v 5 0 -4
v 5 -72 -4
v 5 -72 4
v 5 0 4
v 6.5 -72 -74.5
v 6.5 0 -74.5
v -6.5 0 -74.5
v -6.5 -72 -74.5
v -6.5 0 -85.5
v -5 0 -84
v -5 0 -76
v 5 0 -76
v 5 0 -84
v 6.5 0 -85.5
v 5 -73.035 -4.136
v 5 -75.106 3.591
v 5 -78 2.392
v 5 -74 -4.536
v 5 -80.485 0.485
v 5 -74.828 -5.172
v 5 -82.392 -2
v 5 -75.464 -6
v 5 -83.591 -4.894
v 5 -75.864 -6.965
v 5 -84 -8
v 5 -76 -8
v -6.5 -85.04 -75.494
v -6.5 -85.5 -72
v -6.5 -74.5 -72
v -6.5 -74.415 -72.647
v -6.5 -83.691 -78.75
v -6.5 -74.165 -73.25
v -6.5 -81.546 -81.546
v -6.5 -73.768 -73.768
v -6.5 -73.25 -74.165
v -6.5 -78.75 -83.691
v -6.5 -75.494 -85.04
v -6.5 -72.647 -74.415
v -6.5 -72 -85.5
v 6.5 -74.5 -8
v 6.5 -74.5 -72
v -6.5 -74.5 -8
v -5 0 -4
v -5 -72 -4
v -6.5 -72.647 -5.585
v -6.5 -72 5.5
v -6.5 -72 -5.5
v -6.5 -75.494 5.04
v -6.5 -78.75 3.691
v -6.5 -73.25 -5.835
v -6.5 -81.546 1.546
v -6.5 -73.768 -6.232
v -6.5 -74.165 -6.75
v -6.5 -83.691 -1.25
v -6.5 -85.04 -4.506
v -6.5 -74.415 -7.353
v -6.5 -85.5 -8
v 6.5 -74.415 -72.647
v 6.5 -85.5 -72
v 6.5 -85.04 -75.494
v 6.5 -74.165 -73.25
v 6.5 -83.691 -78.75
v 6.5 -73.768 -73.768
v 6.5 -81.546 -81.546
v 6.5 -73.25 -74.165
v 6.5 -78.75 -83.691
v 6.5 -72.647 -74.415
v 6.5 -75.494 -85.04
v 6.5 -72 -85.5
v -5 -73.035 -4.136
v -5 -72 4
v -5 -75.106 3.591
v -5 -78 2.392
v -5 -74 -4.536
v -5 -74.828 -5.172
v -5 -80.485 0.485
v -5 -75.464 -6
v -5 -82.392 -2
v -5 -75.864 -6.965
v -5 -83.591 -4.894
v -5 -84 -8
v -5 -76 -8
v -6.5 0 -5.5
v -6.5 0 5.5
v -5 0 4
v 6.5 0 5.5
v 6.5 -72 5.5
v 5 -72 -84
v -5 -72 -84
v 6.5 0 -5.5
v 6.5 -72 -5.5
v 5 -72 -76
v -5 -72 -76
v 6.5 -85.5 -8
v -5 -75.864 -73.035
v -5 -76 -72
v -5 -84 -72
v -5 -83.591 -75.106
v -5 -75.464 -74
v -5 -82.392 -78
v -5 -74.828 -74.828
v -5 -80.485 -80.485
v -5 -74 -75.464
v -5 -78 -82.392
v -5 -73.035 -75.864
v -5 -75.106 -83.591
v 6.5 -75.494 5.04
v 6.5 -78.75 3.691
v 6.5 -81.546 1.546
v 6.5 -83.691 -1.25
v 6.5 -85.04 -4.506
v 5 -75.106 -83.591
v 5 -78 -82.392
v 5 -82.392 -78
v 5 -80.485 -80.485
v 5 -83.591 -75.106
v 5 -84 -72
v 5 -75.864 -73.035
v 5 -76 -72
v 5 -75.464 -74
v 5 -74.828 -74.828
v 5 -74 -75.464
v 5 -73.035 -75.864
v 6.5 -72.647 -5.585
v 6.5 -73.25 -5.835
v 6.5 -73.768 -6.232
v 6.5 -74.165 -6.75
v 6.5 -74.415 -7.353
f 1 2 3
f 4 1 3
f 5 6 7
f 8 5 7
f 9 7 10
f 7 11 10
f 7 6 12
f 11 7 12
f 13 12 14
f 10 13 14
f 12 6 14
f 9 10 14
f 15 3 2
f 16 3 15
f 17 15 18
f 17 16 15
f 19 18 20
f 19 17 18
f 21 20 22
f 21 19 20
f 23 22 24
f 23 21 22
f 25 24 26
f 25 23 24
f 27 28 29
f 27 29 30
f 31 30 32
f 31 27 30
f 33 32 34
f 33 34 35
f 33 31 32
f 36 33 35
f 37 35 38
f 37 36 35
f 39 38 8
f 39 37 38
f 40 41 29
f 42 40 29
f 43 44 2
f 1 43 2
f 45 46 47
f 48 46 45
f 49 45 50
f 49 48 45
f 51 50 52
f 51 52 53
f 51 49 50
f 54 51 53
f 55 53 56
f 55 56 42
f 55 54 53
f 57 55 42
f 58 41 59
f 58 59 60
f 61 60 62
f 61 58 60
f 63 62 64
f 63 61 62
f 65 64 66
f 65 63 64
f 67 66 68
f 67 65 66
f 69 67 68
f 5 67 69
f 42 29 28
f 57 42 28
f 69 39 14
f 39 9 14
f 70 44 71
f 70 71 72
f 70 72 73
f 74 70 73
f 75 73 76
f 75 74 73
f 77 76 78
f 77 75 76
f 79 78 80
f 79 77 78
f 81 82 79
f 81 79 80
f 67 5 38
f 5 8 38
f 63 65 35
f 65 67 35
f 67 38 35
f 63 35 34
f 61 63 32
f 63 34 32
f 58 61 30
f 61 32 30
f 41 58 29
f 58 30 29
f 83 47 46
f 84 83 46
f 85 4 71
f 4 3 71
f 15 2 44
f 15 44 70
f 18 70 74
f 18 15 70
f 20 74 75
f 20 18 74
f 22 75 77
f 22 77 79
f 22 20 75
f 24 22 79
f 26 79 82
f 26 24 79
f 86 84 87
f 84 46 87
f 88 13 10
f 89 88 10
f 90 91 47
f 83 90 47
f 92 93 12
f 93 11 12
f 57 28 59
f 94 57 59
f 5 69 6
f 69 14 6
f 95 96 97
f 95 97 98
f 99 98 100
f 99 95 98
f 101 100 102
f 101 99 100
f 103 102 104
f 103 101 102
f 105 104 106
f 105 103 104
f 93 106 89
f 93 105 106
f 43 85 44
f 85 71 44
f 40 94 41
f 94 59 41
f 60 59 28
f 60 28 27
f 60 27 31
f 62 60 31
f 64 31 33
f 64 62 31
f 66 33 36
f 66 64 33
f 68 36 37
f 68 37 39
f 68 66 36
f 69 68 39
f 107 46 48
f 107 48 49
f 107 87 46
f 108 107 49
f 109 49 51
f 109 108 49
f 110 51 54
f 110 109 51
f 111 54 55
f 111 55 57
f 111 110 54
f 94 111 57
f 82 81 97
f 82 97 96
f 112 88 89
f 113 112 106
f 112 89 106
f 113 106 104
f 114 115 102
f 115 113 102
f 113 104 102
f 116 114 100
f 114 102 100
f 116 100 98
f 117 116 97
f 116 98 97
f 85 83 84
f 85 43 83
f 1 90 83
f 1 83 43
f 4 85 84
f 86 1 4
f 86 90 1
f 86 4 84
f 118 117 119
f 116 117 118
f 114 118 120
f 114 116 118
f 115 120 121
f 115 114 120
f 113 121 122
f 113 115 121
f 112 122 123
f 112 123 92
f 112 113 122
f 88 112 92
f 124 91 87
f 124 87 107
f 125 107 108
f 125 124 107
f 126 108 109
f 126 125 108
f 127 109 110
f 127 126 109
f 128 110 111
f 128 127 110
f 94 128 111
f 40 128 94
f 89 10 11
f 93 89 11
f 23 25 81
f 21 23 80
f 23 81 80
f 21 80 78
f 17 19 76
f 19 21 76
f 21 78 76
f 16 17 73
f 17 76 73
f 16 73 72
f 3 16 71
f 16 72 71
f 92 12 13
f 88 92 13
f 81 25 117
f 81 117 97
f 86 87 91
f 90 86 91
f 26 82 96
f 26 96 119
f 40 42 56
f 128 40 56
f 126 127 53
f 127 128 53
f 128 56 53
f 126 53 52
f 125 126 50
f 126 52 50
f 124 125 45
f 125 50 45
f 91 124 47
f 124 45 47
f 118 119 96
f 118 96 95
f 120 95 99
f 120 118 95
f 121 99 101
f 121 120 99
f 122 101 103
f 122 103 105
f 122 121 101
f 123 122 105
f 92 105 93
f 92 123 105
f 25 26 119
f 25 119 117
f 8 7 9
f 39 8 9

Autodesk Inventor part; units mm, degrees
ref_plane "YZ Plane" through (0, 0, 0) normal (1, 0, 0) x (0, 1, 0)
ref_plane "XZ Plane" through (0, 0, 0) normal (0, 1, 0) x (-1, 0, 0)
ref_plane "XY Plane" through (0, 0, 0) normal (0, 0, 1) x (1, 0, 0)
sketch "Sketch1" plane through (0, 0, 0) normal (1, 0, 0) x (0, 1, 0)
  line L0 (0, 0) -> (-72, 0)
  line L1 (-80, -8) -> (-80, -72)
  line L2 (-72, -80) -> (0, -80)
  arc A0 (-72, 0) -> (-80, -8) centre (-72, -8) ccw
  arc A1 (-80, -72) -> (-72, -80) centre (-72, -72) ccw
  point P0 (-80, 0)
  point P1 (-80, -80)
  dimension "d0" = 80
  dimension "d1" = 80
  dimension "d2" = 80
  dimension "d3" = 8
sketch "Sketch2" plane through (0, 0, 0) normal (0, 1, 0) x (-1, 0, 0)
  line L0 (-5, 4) -> (5, 4)
  line L1 (5, 4) -> (5, -4)
  line L2 (5, -4) -> (-5, -4)
  line L3 (-5, -4) -> (-5, 4)
  line L4 (-5, 4) -> (5, -4) construction
  line L5 (5, 4) -> (-5, -4) construction
  line L6 (-6.5, -5.5) -> (6.5, -5.5)
  line L7 (6.5, -5.5) -> (6.5, 5.5)
  line L8 (6.5, 5.5) -> (-6.5, 5.5)
  line L9 (-6.5, 5.5) -> (-6.5, -5.5)
  point P0 (0, 0)
  dimension "d4" = 10
  dimension "d5" = 8
  dimension "d6" = 1.5
sweep "Sweep1" add profiles "Sketch2" path "Sketch1"
properties part number "Part323deabril"
